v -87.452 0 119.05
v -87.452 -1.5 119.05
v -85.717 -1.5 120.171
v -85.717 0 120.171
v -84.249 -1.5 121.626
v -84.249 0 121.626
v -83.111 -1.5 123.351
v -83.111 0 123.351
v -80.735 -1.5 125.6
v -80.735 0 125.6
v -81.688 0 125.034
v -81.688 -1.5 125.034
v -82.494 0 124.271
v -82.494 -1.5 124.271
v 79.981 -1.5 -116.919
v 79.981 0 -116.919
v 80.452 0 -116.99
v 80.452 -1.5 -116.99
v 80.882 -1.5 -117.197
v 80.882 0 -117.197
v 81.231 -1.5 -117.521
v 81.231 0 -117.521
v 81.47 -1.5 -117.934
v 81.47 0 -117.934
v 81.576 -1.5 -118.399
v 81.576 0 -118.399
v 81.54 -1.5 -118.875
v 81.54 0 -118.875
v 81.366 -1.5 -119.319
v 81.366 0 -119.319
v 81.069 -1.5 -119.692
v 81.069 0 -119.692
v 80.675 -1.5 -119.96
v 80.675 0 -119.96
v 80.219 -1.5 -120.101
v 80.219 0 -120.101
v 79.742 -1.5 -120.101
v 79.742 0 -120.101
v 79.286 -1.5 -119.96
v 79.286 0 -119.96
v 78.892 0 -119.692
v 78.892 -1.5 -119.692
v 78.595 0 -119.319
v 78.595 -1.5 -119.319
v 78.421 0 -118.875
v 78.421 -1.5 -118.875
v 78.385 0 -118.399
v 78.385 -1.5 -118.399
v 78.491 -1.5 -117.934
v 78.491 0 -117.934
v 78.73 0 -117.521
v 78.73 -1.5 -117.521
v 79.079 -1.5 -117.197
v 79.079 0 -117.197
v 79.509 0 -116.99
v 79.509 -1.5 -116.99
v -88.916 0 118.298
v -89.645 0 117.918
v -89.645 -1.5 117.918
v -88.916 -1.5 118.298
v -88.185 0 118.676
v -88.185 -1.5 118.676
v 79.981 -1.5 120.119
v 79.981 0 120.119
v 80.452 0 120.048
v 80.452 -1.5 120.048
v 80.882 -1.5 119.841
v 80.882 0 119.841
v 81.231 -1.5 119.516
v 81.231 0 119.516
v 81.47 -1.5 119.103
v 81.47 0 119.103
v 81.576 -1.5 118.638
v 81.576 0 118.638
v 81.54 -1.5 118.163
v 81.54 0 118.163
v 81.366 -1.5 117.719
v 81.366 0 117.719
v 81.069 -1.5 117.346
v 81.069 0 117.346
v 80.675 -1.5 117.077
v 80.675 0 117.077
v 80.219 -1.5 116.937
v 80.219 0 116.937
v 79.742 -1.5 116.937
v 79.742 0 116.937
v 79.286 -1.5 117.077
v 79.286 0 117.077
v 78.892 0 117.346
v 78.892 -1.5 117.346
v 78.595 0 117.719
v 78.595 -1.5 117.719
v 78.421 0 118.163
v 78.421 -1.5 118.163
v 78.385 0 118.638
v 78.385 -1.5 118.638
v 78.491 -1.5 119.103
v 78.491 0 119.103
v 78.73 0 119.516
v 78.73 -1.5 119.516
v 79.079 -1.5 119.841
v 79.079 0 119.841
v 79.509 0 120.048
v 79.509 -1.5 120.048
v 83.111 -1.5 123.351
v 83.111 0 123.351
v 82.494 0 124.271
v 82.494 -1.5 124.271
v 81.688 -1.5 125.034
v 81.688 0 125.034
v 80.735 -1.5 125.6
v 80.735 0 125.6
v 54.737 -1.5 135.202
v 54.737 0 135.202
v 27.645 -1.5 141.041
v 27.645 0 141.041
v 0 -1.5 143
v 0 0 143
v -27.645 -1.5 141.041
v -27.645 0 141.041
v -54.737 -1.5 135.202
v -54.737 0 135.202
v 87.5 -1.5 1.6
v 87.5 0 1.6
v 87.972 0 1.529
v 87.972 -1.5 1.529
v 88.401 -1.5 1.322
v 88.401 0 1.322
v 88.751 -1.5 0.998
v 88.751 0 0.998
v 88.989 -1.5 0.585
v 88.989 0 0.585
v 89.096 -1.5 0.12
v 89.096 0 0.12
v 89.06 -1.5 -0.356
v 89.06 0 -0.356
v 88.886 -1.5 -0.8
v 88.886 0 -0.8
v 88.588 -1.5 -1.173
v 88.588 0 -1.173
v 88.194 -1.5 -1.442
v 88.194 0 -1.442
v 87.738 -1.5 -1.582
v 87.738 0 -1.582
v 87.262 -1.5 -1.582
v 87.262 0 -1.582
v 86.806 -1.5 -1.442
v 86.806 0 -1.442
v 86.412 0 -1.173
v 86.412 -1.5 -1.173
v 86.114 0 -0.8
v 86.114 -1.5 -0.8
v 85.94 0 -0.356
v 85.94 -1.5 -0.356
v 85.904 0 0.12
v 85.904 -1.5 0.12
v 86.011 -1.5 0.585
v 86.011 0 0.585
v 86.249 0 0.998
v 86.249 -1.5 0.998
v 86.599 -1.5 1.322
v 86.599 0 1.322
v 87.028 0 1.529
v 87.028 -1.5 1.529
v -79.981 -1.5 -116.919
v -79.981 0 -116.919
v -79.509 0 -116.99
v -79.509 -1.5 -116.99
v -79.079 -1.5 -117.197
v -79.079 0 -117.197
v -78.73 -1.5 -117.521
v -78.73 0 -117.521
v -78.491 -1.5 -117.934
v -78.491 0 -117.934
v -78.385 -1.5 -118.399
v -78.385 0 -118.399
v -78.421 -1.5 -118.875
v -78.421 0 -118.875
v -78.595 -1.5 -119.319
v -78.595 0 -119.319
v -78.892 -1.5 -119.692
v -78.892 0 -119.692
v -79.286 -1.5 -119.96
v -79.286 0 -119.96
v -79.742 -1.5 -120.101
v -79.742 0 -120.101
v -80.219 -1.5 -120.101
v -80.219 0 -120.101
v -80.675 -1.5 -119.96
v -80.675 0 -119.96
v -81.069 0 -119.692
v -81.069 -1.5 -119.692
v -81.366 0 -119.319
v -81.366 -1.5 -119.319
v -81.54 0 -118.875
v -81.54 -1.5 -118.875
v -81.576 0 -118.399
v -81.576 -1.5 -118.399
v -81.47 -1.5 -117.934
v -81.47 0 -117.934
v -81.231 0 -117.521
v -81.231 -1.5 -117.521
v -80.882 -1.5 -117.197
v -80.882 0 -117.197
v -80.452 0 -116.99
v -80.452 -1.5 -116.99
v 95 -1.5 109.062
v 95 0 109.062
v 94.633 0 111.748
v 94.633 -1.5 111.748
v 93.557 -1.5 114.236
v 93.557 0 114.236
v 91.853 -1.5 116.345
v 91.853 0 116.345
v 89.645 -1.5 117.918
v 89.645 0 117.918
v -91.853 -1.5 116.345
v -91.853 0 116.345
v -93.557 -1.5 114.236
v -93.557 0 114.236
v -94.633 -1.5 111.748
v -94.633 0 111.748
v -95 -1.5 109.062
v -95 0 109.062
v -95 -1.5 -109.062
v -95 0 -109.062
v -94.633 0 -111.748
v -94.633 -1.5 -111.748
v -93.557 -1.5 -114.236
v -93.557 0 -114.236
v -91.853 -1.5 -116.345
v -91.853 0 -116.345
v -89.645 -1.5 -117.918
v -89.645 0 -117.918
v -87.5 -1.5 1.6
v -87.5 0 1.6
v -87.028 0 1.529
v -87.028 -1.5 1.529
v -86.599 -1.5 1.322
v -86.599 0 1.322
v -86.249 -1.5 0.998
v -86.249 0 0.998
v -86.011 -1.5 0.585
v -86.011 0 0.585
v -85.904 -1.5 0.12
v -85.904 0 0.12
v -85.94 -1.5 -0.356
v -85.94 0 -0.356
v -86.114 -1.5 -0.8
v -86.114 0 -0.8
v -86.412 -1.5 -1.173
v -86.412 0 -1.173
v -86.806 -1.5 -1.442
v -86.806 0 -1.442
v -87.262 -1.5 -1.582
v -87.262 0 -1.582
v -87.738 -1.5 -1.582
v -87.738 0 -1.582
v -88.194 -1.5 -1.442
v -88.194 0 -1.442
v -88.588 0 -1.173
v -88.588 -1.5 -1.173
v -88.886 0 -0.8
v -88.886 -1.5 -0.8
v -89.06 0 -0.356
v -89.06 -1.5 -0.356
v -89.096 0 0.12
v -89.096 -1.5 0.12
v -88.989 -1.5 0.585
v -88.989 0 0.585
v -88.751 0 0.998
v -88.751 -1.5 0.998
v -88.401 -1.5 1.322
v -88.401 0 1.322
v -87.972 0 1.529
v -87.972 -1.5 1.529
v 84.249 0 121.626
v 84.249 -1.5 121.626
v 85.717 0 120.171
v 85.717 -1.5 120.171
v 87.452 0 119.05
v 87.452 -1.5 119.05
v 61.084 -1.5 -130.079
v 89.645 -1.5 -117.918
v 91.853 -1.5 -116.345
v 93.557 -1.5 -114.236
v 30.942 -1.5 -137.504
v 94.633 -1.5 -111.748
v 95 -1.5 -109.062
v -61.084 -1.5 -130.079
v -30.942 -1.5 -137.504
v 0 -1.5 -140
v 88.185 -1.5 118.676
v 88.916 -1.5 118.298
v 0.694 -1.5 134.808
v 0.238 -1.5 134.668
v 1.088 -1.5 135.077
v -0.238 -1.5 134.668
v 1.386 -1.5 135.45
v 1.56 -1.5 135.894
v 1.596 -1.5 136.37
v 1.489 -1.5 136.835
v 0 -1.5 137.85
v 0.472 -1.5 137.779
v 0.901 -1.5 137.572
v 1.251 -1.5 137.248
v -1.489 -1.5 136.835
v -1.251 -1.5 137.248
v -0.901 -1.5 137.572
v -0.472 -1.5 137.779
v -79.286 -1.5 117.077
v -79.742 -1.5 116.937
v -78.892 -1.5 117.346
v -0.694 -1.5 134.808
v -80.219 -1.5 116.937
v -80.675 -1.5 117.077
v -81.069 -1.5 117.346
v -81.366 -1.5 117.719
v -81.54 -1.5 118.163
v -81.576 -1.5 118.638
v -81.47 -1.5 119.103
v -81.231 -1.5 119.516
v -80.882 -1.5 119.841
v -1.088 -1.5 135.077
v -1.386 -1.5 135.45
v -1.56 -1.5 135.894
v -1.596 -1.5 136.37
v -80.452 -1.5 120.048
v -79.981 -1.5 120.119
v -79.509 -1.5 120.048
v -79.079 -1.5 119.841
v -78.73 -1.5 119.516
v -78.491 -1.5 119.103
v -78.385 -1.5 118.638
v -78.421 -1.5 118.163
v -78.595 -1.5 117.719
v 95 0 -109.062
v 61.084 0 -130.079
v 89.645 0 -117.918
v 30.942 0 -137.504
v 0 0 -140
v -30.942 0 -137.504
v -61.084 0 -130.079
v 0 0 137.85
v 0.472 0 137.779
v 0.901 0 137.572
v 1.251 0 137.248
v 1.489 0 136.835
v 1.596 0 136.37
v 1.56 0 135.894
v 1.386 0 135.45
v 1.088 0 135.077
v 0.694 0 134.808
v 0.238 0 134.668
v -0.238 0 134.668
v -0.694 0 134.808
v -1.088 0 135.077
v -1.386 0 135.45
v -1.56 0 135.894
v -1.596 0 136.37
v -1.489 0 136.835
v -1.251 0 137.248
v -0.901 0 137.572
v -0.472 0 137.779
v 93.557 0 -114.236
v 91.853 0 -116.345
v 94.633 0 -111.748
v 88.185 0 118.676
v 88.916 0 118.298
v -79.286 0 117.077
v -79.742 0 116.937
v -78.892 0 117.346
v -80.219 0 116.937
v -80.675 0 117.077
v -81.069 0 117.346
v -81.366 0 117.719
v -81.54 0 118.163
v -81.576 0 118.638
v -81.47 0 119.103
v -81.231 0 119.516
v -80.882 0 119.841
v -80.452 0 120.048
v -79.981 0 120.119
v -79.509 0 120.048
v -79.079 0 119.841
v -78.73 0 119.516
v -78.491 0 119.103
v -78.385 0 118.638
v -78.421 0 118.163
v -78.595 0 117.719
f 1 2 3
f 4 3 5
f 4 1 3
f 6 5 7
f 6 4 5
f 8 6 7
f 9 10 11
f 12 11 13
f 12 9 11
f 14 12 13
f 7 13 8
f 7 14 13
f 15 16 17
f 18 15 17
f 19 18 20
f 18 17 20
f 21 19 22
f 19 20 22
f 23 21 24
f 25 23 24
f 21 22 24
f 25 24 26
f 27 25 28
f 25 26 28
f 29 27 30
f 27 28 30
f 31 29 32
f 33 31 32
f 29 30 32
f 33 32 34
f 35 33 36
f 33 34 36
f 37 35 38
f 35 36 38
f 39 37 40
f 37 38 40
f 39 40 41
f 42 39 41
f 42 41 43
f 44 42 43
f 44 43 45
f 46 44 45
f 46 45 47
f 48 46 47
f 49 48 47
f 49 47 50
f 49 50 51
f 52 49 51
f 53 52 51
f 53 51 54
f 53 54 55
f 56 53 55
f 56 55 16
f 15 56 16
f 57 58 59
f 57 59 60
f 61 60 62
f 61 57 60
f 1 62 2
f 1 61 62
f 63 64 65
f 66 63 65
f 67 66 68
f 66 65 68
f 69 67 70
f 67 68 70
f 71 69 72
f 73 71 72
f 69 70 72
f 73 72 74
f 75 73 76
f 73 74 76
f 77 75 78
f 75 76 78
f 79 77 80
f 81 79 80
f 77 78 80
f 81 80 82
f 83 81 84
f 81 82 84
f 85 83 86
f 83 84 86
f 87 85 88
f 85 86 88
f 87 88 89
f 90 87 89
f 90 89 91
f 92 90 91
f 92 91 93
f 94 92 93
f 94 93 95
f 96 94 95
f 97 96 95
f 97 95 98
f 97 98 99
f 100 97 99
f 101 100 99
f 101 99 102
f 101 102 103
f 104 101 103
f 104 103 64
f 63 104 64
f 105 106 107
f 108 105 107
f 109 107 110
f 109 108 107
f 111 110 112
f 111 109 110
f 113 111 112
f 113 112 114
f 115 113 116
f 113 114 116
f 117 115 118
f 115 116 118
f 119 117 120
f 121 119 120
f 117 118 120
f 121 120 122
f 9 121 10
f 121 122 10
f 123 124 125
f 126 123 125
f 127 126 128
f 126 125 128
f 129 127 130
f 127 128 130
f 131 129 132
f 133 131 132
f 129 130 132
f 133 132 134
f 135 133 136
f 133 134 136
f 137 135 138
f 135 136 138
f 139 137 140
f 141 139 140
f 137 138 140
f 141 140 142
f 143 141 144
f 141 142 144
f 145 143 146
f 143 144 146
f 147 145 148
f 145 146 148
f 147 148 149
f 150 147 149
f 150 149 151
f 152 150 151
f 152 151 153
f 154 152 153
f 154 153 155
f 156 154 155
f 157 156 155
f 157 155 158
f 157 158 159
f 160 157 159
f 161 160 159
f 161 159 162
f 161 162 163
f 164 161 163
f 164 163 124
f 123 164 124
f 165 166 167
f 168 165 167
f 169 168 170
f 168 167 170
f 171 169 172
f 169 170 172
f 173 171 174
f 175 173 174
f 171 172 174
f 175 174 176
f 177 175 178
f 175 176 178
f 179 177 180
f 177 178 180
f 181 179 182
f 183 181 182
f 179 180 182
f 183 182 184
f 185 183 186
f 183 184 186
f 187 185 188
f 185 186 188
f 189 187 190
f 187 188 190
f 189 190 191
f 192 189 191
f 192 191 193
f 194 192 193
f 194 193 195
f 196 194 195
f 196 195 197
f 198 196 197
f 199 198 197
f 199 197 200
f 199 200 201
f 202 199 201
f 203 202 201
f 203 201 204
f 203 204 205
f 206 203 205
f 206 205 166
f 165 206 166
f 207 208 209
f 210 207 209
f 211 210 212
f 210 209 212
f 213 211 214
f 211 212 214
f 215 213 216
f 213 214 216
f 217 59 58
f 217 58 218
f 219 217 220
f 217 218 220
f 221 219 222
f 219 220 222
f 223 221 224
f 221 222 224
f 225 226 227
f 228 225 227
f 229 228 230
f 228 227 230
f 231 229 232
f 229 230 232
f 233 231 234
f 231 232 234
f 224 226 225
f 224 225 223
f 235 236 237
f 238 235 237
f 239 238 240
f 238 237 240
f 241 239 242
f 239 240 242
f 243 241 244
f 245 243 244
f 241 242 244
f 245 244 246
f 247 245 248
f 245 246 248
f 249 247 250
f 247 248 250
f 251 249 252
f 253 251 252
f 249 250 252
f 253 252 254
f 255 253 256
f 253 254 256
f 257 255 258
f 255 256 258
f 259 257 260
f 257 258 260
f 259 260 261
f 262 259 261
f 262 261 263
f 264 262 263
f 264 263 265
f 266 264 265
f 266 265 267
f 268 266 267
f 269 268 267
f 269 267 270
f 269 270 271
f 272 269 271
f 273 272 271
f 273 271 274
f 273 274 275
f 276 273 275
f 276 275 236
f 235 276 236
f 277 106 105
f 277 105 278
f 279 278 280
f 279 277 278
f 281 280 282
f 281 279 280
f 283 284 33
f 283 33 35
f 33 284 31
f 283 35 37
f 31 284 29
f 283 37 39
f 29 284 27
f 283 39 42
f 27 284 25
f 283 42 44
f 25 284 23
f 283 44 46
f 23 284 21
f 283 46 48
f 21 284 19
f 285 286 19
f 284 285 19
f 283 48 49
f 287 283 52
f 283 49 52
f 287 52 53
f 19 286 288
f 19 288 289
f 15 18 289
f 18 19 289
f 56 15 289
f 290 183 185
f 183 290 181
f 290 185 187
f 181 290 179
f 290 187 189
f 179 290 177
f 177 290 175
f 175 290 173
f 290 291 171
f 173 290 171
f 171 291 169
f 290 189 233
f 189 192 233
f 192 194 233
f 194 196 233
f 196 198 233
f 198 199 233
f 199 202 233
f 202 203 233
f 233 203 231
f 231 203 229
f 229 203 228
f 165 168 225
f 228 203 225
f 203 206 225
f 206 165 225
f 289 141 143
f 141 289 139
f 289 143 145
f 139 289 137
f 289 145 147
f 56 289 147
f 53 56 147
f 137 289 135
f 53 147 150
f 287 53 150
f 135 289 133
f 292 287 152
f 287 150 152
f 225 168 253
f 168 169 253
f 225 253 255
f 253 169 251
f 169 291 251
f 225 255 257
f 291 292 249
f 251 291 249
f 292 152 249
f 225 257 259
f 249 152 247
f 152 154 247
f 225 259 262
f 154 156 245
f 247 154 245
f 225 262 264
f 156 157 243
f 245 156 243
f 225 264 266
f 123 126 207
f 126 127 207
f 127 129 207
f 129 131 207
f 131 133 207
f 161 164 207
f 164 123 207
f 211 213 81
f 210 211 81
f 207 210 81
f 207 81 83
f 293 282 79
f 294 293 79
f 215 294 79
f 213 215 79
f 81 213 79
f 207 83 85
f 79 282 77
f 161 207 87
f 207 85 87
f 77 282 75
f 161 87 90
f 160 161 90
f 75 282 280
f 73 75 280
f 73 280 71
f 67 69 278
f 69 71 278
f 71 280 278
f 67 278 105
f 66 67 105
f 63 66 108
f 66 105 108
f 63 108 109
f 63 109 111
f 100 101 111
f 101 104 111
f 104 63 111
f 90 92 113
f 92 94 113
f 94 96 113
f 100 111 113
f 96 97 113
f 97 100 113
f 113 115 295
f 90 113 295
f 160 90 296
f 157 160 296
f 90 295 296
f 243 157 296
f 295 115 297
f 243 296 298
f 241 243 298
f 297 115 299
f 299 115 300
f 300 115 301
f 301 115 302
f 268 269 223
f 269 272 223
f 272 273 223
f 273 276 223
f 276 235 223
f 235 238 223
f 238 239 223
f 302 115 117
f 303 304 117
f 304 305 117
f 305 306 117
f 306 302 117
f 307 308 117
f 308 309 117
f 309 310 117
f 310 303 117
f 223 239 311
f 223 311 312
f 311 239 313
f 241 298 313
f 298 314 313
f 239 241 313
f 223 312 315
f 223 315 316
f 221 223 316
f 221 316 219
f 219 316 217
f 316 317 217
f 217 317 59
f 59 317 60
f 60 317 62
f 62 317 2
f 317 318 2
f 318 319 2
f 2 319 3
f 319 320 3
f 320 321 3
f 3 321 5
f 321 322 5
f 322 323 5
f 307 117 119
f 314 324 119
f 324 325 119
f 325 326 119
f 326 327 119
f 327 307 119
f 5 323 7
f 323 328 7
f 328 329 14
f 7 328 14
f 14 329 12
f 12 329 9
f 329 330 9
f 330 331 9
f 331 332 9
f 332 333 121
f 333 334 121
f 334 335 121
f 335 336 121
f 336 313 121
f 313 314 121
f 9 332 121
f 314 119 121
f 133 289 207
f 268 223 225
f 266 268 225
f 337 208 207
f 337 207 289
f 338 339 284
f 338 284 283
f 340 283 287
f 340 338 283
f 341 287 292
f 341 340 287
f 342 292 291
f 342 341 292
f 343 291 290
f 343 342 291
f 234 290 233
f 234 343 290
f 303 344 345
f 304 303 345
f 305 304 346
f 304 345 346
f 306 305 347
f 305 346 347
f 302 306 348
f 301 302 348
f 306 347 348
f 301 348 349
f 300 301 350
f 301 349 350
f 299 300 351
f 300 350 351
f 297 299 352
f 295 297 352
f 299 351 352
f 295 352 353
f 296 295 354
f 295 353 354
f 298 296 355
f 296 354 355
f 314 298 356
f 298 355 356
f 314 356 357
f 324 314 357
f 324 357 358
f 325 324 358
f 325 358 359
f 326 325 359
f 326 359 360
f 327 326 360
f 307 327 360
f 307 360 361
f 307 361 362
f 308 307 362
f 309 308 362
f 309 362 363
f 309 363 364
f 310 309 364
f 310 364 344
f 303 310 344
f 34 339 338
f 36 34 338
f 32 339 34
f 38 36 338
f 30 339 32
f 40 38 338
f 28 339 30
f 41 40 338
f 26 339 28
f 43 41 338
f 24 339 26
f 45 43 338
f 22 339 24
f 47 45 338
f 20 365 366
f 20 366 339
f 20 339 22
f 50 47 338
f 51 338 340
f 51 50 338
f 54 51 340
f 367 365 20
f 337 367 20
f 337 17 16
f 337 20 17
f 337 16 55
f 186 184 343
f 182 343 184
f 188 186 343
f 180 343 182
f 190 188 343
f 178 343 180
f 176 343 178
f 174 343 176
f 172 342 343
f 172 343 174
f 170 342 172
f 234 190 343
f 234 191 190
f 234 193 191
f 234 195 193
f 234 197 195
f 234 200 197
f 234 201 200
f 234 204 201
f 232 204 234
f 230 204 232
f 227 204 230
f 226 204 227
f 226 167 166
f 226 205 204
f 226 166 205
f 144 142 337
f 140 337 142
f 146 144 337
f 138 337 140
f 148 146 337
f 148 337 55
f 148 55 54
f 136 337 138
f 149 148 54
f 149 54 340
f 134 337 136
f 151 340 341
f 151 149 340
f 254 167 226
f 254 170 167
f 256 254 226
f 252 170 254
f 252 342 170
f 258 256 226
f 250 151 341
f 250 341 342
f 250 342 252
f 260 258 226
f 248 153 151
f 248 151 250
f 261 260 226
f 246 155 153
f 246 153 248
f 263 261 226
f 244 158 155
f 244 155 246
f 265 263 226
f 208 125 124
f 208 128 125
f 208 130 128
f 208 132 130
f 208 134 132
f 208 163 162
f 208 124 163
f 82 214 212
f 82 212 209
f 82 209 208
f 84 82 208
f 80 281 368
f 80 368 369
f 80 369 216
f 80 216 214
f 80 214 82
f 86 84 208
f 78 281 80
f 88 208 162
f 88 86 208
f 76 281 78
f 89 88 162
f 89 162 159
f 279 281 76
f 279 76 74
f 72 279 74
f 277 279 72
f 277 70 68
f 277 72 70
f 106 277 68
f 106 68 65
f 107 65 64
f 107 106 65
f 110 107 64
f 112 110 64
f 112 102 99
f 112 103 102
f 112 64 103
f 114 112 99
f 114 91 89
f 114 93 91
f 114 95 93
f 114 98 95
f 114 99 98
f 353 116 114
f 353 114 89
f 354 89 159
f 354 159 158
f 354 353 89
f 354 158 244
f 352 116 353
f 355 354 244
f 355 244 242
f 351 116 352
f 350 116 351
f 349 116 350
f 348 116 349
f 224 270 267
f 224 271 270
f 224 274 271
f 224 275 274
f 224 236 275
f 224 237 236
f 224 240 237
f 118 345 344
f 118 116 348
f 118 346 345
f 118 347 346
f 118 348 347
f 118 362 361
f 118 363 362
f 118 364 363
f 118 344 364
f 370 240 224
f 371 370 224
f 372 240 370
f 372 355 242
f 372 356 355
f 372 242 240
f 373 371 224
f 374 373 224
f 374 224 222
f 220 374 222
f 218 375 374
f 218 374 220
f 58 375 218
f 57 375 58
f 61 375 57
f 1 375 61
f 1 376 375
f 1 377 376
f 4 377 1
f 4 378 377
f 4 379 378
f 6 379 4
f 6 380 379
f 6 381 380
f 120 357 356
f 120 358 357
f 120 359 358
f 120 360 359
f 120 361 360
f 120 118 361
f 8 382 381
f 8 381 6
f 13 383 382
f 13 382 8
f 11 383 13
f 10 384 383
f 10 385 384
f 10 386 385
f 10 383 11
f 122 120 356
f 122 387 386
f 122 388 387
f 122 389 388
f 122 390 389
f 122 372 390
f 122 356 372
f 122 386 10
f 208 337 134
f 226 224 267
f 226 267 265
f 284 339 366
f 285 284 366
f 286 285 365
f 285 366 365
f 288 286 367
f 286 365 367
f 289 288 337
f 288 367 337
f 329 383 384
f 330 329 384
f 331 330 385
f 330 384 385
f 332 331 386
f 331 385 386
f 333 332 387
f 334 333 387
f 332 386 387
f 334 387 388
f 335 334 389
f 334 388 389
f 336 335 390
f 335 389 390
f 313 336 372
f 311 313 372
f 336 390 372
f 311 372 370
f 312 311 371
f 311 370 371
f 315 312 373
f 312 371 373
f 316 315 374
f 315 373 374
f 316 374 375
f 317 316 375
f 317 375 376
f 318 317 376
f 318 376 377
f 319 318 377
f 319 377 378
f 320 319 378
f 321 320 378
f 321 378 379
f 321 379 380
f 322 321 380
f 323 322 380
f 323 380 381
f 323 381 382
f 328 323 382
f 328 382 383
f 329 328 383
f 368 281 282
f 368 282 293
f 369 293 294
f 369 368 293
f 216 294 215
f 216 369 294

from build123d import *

# Parameters (mm, degrees)
BASE_FLANGE1_DEPTH = 1.5
TAB1_DEPTH         = 1.5
FILLET1_R          = 10
FILLET2_R          = 5
SKETCH9_R          = 1.6
CUT_EXTRUDE1_DEPTH = 172.686487668


# Sheet-metal steps are written as plain solids
with BuildPart() as part:
    # Base-Flange1: sheet metal written as solids
    # Sketch1 → Base-Flange1 (new body)
    with BuildSketch(Plane(origin=(0, 0, 0), x_dir=(1, 0, 0), z_dir=(0, 1, 0))):
        with BuildLine():
            Line((95, -115), (95, 115))
            ThreePointArc((95, 115), (0, 140), (-95, 115))
            Line((-95, 115), (-95, -115))
            ThreePointArc((-95, -115), (0, -140), (95, -115))
        make_face()
    extrude(amount=-BASE_FLANGE1_DEPTH)

    # Tab1: sheet metal written as solids
    # Sketch2 → Tab1 (add)
    with BuildSketch(Plane(origin=(0, 0, 0), x_dir=(1, 0, 0), z_dir=(0, 1, 0))):
        with BuildLine():
            Line((-82.5, -124.791310249), (-82.5, -121.478508705))
            ThreePointArc((-82.5, -121.478508705), (0, -140), (82.5, -121.478508705))
            Line((82.5, -121.478508705), (82.5, -124.791310249))
            ThreePointArc((82.5, -124.791310249), (0, -143), (-82.5, -124.791310249))
        make_face()
    extrude(amount=-TAB1_DEPTH)

    # Fillet1
    # the kernel refuses this fillet: 10 mm, written as the material it adds along each edge
    with BuildSketch(Plane(origin=(-82.5, 0, 121.478508705), x_dir=(-0.8978334247322157, 0, -0.4403352602661074), z_dir=(0, -1, 0))) as fillet1_piece_1:
        with BuildLine():
            CenterArc((5.658454261, -9.998979067), FILLET1_R, 90.818728741, 44.556283737)
            Line((-1.45874333, -2.974343955), (0, 0))
            ThreePointArc((0, 0), (2.757782001, -0.019704015), (5.515564002, 0))
        make_face()
    extrude(amount=1.5)
    with BuildSketch(Plane(origin=(82.5, 0, 121.478508705), x_dir=(0.8978334247322127, 0, -0.44033526026611364), z_dir=(0, -1, 0))) as fillet1_piece_2:
        with BuildLine():
            CenterArc((5.658454261, 9.998979067), FILLET1_R, 224.624987522, 44.556283737)
            Line((-1.45874333, 2.974343955), (0, 0))
            ThreePointArc((0, 0), (2.757782001, 0.019704015), (5.515564002, 0))
        make_face()
    extrude(amount=1.5)
    # the kernel refuses this fillet: 10 mm, written as the material it takes off along each edge
    with BuildSketch(Plane(origin=(-95, 15.245934007, 115), x_dir=(0, 0, -1), z_dir=(0, -1, 0))) as fillet1_2_piece_1:
        with BuildLine():
            CenterArc((5.938283361, 10), FILLET1_R, 207.676630301, 62.323369699)
            ThreePointArc((-2.917548149, 5.355191257), (-1.479926921, 2.6660714), (0, 0))
            Line((0, 0), (5.938283361, 0))
        make_face()
    extrude(amount=31.991868015, mode=Mode.SUBTRACT)
    with BuildSketch(Plane(origin=(95, 15.245934007, 115), x_dir=(0, 0, -1), z_dir=(0, -1, 0)), Plane(origin=(-95, 15.245934007, -115), x_dir=(0, 0, 1), z_dir=(0, -1, 0))) as fillet1_2_piece_2:
        with BuildLine():
            CenterArc((5.938283361, -10), FILLET1_R, 90, 62.323369699)
            ThreePointArc((-2.917548149, -5.355191257), (-1.479926921, -2.6660714), (0, 0))
            Line((0, 0), (5.938283361, 0))
        make_face()
    extrude(amount=31.991868015, mode=Mode.SUBTRACT)
    with BuildSketch(Plane(origin=(95, 15.245934007, -115), x_dir=(-0.8781343363797829, 0, -0.47841413782500014), z_dir=(0, -1, 0))) as fillet1_2_piece_3:
        with BuildLine():
            CenterArc((5.94038465, -9.998751897), FILLET1_R, 89.094752314, 62.323369699)
            Line((-2.840958714, -5.214610518), (0, 0))
            ThreePointArc((0, 0), (3.049186801, 0.024088395), (6.098373603, 0))
        make_face()
    extrude(amount=31.991868015, mode=Mode.SUBTRACT)

    # Fillet2
    fillet2_edges = [part.edges().sort_by_distance(p)[0] for p in [
        (82.5, -0.75, 124.791310249),
        (-82.5, -0.75, 124.791310249),
    ]]
    fillet(fillet2_edges, radius=FILLET2_R)

    # Sketch9 → Cut-Extrude1 (cut, through all)
    with BuildSketch(Plane(origin=(0, 0, 0), x_dir=(1, 0, 0), z_dir=(0, 1, 0))):
        with Locations(Location((-79.980506034, 118.518748697, 0), (0, 0, 270))):
            Circle(SKETCH9_R)
        with Locations(Location((79.980506034, 118.518748697, 0), (0, 0, 270))):
            Circle(SKETCH9_R)
        with Locations(Location((-79.980506034, -118.518748697, 0), (0, 0, 270))):
            Circle(SKETCH9_R)
        with Locations(Location((0, -136.25, 0), (0, 0, 270))):
            Circle(SKETCH9_R)
        with Locations(Location((79.980506034, -118.518748697, 0), (0, 0, 270))):
            Circle(SKETCH9_R)
        with Locations(Location((87.5, 0, 0), (0, 0, 270))):
            Circle(SKETCH9_R)
        with Locations(Location((-87.5, 0, 0), (0, 0, 270))):
            Circle(SKETCH9_R)
    extrude(amount=-CUT_EXTRUDE1_DEPTH, mode=Mode.SUBTRACT)


solid = part.part
